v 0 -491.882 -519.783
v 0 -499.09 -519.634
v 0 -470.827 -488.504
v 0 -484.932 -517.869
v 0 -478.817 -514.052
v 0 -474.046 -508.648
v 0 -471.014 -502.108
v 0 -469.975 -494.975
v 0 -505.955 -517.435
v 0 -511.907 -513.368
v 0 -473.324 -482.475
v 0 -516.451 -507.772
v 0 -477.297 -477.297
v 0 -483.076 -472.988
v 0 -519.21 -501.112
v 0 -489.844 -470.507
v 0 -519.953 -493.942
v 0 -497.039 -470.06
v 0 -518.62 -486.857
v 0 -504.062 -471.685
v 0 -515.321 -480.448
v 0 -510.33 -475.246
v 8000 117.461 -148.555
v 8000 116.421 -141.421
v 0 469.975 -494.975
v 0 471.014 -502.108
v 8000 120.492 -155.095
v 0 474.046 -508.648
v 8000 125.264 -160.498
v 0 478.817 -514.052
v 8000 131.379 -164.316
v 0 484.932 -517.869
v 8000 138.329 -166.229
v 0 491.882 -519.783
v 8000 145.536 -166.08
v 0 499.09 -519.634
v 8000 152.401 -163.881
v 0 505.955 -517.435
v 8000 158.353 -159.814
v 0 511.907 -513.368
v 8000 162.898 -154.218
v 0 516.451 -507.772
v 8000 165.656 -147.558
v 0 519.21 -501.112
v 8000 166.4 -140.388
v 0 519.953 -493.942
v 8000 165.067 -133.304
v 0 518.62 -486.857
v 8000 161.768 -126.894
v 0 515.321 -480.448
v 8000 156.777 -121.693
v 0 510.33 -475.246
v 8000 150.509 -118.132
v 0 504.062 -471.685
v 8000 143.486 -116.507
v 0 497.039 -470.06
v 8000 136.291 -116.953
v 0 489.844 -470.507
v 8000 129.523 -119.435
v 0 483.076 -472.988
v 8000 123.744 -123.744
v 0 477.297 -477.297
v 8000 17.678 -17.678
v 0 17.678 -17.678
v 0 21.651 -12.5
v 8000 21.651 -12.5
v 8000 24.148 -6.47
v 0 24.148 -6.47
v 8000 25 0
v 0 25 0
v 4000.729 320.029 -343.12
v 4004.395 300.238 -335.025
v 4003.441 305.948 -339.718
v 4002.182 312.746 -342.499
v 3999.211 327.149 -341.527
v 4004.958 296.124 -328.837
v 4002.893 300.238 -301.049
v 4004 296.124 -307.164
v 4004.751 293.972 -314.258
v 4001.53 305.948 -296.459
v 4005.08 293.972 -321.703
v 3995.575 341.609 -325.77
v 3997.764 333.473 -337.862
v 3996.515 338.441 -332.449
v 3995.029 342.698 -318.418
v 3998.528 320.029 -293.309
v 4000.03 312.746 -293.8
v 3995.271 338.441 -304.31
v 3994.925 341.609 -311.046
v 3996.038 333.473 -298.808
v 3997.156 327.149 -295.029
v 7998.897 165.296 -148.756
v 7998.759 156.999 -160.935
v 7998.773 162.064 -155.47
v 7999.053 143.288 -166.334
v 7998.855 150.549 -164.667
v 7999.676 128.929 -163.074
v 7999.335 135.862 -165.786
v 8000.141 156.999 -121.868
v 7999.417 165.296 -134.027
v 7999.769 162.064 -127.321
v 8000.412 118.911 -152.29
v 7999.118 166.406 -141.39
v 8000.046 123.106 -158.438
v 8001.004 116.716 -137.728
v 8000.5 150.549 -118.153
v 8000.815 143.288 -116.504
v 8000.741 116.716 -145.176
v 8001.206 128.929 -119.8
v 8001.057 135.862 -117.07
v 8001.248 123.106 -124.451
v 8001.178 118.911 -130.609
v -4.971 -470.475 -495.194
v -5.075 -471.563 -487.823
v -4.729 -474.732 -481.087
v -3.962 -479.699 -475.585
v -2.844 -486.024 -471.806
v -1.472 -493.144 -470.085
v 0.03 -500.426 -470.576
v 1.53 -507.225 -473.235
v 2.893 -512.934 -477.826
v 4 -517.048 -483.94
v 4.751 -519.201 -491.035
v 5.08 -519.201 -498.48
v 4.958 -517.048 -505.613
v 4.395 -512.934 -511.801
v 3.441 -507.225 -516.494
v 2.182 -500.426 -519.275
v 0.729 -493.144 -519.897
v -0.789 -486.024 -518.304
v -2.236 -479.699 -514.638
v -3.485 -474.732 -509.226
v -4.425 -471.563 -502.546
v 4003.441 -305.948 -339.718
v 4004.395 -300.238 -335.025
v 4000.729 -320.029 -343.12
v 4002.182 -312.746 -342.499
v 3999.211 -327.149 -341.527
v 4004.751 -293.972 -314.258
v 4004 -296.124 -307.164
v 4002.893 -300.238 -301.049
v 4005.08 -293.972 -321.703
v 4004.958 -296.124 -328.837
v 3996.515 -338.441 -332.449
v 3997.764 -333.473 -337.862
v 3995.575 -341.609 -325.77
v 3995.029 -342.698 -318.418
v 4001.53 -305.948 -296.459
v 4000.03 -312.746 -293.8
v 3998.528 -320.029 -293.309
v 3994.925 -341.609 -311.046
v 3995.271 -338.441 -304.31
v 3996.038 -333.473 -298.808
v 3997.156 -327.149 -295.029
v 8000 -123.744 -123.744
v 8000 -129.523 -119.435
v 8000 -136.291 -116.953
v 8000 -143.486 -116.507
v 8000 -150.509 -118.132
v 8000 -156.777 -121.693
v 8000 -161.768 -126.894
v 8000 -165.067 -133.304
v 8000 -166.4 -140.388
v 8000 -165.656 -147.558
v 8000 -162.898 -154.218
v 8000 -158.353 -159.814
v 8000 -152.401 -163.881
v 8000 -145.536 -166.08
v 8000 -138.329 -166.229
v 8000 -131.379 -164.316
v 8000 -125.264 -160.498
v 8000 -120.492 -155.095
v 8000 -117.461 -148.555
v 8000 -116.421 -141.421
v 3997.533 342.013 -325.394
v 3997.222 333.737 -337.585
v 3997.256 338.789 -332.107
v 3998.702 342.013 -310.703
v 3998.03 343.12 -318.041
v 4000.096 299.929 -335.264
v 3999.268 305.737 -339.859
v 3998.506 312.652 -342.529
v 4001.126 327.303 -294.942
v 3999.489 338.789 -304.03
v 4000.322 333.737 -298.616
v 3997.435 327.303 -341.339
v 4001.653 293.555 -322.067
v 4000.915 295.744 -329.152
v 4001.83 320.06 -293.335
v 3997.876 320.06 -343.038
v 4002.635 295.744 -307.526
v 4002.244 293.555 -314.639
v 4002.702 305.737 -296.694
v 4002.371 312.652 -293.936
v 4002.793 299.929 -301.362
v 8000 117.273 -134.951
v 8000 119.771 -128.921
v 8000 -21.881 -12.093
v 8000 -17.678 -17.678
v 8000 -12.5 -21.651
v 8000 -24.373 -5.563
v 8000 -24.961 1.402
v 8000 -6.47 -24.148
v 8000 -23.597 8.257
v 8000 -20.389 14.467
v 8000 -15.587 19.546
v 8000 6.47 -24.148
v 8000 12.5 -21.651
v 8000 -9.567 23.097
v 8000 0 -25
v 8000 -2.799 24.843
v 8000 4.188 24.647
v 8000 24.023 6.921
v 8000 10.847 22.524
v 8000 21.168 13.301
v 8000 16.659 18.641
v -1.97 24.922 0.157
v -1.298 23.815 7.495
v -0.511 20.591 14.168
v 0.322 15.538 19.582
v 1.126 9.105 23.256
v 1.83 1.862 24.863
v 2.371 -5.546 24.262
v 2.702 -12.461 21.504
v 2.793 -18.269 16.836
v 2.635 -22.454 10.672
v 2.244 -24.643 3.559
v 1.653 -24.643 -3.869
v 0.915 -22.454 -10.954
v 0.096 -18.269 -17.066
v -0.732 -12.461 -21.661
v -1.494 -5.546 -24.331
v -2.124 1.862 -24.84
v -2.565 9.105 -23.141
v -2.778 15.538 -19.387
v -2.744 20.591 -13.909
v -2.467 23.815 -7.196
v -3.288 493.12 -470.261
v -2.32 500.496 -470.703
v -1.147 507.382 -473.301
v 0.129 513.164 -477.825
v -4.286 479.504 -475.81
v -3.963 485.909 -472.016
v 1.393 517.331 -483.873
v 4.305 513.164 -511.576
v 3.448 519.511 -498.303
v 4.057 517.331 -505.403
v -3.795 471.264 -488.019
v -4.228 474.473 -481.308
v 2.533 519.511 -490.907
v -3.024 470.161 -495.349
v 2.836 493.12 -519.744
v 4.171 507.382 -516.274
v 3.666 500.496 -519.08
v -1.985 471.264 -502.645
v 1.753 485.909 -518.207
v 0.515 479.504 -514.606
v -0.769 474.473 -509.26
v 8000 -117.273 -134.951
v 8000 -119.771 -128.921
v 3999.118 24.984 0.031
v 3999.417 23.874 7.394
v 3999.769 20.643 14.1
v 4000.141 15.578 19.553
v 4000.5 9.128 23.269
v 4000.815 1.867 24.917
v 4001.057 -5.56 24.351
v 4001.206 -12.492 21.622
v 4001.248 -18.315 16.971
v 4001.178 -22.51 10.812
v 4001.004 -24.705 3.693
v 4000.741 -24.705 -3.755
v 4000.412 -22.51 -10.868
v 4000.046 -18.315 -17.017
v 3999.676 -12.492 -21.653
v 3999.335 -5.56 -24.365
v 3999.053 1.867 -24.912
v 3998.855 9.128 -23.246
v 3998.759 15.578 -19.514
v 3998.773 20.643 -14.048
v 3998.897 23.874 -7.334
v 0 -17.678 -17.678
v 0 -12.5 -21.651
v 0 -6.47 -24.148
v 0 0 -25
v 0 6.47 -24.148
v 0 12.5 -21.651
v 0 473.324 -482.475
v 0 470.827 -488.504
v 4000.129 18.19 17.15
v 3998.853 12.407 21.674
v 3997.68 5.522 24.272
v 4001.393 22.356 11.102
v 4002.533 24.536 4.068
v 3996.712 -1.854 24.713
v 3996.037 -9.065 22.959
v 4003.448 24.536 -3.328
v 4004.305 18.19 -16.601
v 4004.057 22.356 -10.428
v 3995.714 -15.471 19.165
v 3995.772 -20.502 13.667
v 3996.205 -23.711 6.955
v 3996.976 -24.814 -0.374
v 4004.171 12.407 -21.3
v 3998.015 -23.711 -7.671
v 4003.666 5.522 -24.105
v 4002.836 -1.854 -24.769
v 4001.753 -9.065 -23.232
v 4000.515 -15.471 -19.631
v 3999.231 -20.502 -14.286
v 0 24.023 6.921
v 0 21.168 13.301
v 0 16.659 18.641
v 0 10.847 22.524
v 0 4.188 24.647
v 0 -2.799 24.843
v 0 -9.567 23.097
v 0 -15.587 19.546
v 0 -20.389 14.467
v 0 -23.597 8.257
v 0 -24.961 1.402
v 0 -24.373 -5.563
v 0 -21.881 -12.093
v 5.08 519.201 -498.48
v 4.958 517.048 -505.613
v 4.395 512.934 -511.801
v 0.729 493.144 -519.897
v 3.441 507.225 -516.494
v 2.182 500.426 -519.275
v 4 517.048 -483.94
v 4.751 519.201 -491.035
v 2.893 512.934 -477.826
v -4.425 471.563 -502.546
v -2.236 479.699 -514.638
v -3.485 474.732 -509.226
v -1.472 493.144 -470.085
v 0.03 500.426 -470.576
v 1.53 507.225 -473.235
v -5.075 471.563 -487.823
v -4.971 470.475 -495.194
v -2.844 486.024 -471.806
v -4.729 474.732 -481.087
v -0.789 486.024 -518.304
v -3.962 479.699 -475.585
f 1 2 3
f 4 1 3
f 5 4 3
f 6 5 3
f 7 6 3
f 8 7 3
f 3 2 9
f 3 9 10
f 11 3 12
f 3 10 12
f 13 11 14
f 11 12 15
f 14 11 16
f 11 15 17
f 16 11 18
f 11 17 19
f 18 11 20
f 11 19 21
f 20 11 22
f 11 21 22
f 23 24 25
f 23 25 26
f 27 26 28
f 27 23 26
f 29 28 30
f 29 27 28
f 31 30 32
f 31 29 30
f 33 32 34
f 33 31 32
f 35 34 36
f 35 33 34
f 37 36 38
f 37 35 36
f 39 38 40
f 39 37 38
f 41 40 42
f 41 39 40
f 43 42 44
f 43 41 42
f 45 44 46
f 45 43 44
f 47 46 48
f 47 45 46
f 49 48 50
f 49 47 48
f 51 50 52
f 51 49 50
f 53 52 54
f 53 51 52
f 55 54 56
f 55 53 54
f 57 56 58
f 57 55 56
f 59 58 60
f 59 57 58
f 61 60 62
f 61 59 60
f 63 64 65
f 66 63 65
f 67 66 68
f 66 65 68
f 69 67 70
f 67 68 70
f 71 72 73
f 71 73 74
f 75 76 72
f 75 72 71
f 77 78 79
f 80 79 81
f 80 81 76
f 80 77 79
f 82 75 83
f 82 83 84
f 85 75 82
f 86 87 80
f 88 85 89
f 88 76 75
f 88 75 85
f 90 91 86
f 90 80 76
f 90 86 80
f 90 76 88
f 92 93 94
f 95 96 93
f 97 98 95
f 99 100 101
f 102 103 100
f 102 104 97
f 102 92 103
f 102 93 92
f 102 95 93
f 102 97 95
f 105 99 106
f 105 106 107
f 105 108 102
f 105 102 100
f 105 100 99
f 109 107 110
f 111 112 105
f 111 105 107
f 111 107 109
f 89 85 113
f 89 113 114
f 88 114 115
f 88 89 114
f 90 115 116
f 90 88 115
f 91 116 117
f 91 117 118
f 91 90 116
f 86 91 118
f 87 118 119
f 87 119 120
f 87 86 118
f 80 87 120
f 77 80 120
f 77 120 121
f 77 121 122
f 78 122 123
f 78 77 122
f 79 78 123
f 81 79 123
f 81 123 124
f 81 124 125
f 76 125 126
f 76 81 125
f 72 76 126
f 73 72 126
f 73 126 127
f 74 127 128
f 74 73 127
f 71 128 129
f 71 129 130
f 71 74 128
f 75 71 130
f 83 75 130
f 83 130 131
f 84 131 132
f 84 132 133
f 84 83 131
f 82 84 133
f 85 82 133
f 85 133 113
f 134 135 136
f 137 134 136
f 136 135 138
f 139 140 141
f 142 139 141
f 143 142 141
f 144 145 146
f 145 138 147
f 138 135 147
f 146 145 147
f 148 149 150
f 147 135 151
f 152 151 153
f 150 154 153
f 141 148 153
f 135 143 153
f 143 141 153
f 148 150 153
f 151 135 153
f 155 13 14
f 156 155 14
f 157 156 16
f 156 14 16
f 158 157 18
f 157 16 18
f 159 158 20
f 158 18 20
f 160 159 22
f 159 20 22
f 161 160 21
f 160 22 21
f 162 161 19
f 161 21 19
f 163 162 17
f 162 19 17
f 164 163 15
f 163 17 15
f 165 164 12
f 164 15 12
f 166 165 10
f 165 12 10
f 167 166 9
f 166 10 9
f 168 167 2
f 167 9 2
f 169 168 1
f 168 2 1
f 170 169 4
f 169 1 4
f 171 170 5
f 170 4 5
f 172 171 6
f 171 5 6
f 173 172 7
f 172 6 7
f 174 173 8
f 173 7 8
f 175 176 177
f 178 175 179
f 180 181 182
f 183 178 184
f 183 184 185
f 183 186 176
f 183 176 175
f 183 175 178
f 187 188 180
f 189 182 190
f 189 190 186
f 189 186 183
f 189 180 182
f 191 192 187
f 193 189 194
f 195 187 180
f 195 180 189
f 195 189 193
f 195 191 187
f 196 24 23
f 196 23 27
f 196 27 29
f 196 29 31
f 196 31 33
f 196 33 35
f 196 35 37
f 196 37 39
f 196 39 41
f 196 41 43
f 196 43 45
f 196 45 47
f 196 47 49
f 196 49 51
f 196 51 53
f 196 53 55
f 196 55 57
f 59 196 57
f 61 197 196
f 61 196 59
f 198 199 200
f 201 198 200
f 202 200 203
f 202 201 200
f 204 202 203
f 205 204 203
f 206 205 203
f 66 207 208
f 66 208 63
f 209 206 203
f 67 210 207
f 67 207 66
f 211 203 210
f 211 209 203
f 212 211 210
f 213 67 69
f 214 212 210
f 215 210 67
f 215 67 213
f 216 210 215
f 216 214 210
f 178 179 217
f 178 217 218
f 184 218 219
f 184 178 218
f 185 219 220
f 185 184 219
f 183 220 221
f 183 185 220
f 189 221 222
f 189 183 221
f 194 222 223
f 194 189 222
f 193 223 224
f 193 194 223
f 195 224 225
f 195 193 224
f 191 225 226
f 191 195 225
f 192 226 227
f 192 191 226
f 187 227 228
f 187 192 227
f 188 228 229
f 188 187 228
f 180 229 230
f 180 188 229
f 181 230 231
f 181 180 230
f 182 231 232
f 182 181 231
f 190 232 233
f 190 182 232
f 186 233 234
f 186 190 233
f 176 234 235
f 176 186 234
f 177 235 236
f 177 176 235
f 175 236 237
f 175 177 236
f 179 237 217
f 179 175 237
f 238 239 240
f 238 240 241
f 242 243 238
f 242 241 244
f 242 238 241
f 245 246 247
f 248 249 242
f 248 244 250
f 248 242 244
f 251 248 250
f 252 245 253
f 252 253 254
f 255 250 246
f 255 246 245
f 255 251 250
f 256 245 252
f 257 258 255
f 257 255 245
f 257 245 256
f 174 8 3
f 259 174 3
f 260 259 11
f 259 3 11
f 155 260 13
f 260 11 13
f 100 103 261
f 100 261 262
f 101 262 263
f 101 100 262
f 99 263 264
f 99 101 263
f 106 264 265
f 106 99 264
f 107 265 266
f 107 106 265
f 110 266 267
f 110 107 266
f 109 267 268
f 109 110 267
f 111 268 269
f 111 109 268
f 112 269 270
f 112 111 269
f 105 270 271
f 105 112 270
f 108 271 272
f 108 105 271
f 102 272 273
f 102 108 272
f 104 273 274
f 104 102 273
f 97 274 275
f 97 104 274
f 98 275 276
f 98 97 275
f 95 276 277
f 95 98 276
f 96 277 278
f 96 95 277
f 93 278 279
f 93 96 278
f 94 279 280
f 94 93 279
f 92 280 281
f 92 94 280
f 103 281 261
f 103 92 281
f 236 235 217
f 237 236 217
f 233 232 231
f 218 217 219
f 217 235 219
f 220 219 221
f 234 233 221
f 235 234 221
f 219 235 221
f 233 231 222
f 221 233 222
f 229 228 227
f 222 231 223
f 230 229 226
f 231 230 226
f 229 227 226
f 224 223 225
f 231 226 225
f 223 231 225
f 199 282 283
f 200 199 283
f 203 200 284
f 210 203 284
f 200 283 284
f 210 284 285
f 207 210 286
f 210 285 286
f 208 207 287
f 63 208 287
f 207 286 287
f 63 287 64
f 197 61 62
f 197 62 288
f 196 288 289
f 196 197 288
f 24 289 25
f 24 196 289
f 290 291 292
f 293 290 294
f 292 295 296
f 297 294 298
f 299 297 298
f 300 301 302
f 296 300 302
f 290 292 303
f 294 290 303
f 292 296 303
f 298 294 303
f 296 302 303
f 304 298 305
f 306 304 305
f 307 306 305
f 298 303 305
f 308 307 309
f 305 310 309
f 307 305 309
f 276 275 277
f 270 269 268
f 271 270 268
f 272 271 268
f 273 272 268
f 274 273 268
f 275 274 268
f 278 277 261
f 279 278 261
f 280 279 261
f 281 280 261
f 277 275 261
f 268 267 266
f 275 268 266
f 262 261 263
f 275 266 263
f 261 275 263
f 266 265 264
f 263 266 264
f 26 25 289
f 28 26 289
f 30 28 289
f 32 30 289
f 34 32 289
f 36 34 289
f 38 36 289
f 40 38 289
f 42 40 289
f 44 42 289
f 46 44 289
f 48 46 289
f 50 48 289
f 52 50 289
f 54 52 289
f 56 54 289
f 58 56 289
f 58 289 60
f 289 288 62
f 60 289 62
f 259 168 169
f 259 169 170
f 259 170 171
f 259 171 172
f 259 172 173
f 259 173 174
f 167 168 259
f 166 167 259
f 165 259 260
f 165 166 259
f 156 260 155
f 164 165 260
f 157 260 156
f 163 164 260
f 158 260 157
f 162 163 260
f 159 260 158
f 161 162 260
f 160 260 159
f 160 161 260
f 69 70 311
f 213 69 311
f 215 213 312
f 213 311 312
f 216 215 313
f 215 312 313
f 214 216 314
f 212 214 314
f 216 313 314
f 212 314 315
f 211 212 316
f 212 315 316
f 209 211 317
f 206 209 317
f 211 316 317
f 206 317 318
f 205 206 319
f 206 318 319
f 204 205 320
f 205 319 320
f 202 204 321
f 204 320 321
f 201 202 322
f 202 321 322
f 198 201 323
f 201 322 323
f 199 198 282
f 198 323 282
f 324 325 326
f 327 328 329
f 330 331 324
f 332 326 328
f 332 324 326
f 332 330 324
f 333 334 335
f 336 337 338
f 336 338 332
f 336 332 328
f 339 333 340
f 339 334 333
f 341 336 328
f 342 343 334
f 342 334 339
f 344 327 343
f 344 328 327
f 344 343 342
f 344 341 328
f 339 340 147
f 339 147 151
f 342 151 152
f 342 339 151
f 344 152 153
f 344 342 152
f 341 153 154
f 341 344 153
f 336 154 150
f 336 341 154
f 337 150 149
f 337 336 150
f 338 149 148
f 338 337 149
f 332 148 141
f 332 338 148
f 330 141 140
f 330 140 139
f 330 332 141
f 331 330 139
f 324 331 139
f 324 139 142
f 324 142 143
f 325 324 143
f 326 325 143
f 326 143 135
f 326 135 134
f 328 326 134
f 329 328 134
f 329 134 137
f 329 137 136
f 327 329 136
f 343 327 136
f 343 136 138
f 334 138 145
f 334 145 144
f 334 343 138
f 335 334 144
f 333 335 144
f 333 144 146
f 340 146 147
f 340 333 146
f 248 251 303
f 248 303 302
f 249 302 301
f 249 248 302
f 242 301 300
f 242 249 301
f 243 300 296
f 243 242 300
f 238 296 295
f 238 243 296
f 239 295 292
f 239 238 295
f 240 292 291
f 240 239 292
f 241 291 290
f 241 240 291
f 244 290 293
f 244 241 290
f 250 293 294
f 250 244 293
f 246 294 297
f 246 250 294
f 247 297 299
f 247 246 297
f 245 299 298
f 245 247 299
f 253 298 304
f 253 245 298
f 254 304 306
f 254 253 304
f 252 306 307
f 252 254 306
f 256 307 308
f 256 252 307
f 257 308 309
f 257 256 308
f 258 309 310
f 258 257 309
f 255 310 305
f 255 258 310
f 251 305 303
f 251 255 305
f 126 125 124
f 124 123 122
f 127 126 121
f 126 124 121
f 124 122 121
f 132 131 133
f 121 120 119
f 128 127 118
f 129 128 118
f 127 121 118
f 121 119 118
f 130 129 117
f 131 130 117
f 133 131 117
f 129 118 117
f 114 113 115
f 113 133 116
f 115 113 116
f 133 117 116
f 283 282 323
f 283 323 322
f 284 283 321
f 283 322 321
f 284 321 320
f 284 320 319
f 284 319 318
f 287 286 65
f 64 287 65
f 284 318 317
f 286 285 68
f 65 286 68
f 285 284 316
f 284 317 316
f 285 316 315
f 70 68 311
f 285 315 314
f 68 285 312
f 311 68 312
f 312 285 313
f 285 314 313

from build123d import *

# Parameters (mm, degrees)
F1_DEPTH = 8000
F37_R    = 25
F40_R    = 25
F43_R    = 25
F46_R    = 25
F49_R    = 25


with BuildPart() as f1:
    # F0 (on Right) → F1 (new body)
    with BuildSketch(Plane.YZ):
        with BuildLine():
            ThreePointArc((17.6776695297, -17.6776695297), (23.0969883128, -9.5670858091), (25, 0))
            ThreePointArc((25, 0), (-9.5670858091, 23.0969883128), (-17.6776695297, -17.6776695297))
            Line((-17.6776695297, -17.6776695297), (0, 0))
            Line((0, 0), (17.6776695297, -17.6776695297))
        make_face()
        with BuildLine():
            Line((0, 0), (-17.6776695297, -17.6776695297))
            ThreePointArc((-17.6776695297, -17.6776695297), (0, -25), (17.6776695297, -17.6776695297))
            Line((17.6776695297, -17.6776695297), (0, 0))
        make_face()
    extrude(amount=F1_DEPTH)


with BuildPart() as f6:
    # F6: sweep along a path in F5
    with BuildLine(Plane(origin=(21.8323586745, 0, -494.0098837763), x_dir=(0.9990248657, 0, 0.0441510786), z_dir=(0.0441510786, 0, -0.9990248657))) as f6_path:
        Line((-21.8536689369, -494.9747468306), (7985.9550200866, -141.4213562373))
    # F0 (on Right) → F6 (sweep)
    with BuildSketch(Plane.YZ):
        with BuildLine():
            ThreePointArc((519.9747468306, -494.9747468306), (504.5418326397, -471.8777585178), (477.2970773009, -477.2970773009))
            Line((477.2970773009, -477.2970773009), (494.9747468306, -494.9747468306))
            Line((494.9747468306, -494.9747468306), (469.9747468306, -494.9747468306))
            ThreePointArc((469.9747468306, -494.9747468306), (494.9747468306, -519.9747468306), (519.9747468306, -494.9747468306))
        make_face()
        with BuildLine():
            Line((494.9747468306, -494.9747468306), (477.2970773009, -477.2970773009))
            ThreePointArc((477.2970773009, -477.2970773009), (471.8777585178, -485.4076610215), (469.9747468306, -494.9747468306))
            Line((469.9747468306, -494.9747468306), (494.9747468306, -494.9747468306))
        make_face()
    sweep(path=f6_path.line)


with BuildPart() as f7:
    # F7: sweep along a path in F5
    with BuildLine(Plane(origin=(21.8323586745, 0, -494.0098837763), x_dir=(0.9990248657, 0, 0.0441510786), z_dir=(0.0441510786, 0, -0.9990248657))) as f7_path:
        Line((7985.9550200866, 141.4213562373), (-21.8536689369, 494.9747468306))
    # F0 (on Right) → F7 (sweep)
    with BuildSketch(Plane.YZ):
        with BuildLine():
            Line((-494.9747468306, -494.9747468306), (-477.2970773009, -477.2970773009))
            ThreePointArc((-477.2970773009, -477.2970773009), (-518.0717351434, -504.5418326397), (-469.9747468306, -494.9747468306))
            Line((-469.9747468306, -494.9747468306), (-494.9747468306, -494.9747468306))
        make_face()
        with BuildLine():
            ThreePointArc((-469.9747468306, -494.9747468306), (-471.8777585178, -485.4076610215), (-477.2970773009, -477.2970773009))
            Line((-477.2970773009, -477.2970773009), (-494.9747468306, -494.9747468306))
            Line((-494.9747468306, -494.9747468306), (-469.9747468306, -494.9747468306))
        make_face()
    sweep(path=f7_path.line)


with BuildPart() as f38:
    # F38: sweep along a path in F35
    with BuildLine(Plane(origin=(21.8323586745, 0, -494.0098837763), x_dir=(0.9990248657, 0, 0.0441510786), z_dir=(0.0441510786, 0, -0.9990248657))) as f38_path:
        Line((3982.0506755748, 318.1980515339), (-21.8536689369, -494.9747468306))
    # F37 (on line) → F38 (sweep)
    with BuildSketch(Plane(origin=(-117.4180020968, 23.8702813358, -5.1891915947), x_dir=(-0.1988375705, -0.9799930618, -0.0087874622), z_dir=(-0.9790374369, 0.1990316531, -0.0432677507))):
        with Locations((-480.7222457814, -494.4920799709)):
            Circle(F37_R)
    sweep(path=f38_path.line)


with BuildPart() as f41:
    # F41: sweep along a path in F34
    with BuildLine(Plane(origin=(0, 0, 0), x_dir=(1, 0, 0), z_dir=(0, -0.7071067812, -0.7071067812))) as f41_path:
        Line((0, 0), (4000, -450))
    # F40 (on line) → F41 (sweep)
    with BuildSketch(Plane(origin=(0, 0, 0), x_dir=(-0.0788019012, 0.9968705856, 0.0062686529), z_dir=(0.9937313162, 0.0790508421, -0.0790508421))):
        Circle(F40_R)
    sweep(path=f41_path.line)


with BuildPart() as f44:
    # F44: sweep along a path in F35
    with BuildLine(Plane(origin=(21.8323586745, 0, -494.0098837763), x_dir=(0.9990248657, 0, 0.0441510786), z_dir=(0.0441510786, 0, -0.9990248657))) as f44_path:
        Line((-21.8536689369, 494.9747468306), (3982.0506755748, -318.1980515339))
    # F43 (on line) → F44 (sweep)
    with BuildSketch(Plane(origin=(-117.4180020968, -23.8702813358, -5.1891915947), x_dir=(-0.1988375705, 0.9799930618, -0.0087874622), z_dir=(0.9790374369, 0.1990316531, 0.0432677507))):
        with Locations((-480.7222457814, -494.492079971)):
            Circle(F43_R)
    sweep(path=f44_path.line)


with BuildPart() as f47:
    # F47: sweep along a path in F34
    with BuildLine(Plane(origin=(0, 0, 0), x_dir=(1, 0, 0), z_dir=(0, -0.7071067812, -0.7071067812))) as f47_path:
        Line((4000, 0), (0, -700))
    # F46 (on line) → F47 (sweep)
    with BuildSketch(Plane(origin=(-118.8599151001, 14.7081640962, -14.7081640962), x_dir=(-0.1209686539, -0.9925434553, -0.0149691072), z_dir=(-0.9850304672, 0.1218913015, -0.1218913015))):
        with Locations((-483.8746154449, -491.2280701754)):
            Circle(F46_R)
    sweep(path=f47_path.line)


with BuildPart() as f50:
    # F50: sweep along a path in F34
    with BuildLine(Plane(origin=(0, 0, 0), x_dir=(1, 0, 0), z_dir=(0, -0.7071067812, -0.7071067812))) as f50_path:
        Line((4000, 0), (8000, -200))
    # F49 (on line) → F50 (sweep)
    with BuildSketch(Plane(origin=(3990.0249376559, 141.068684526, -141.068684526), x_dir=(-0.0352891787, 0.9993763641, 0.0012476609), z_dir=(0.9987523389, 0.0353112276, -0.0353112276))):
        with Locations((-141.1567149149, 141.3330506675)):
            Circle(F49_R)
    sweep(path=f50_path.line)


solid = Compound([f1.part, f6.part, f7.part, f38.part, f41.part, f44.part, f47.part, f50.part])
